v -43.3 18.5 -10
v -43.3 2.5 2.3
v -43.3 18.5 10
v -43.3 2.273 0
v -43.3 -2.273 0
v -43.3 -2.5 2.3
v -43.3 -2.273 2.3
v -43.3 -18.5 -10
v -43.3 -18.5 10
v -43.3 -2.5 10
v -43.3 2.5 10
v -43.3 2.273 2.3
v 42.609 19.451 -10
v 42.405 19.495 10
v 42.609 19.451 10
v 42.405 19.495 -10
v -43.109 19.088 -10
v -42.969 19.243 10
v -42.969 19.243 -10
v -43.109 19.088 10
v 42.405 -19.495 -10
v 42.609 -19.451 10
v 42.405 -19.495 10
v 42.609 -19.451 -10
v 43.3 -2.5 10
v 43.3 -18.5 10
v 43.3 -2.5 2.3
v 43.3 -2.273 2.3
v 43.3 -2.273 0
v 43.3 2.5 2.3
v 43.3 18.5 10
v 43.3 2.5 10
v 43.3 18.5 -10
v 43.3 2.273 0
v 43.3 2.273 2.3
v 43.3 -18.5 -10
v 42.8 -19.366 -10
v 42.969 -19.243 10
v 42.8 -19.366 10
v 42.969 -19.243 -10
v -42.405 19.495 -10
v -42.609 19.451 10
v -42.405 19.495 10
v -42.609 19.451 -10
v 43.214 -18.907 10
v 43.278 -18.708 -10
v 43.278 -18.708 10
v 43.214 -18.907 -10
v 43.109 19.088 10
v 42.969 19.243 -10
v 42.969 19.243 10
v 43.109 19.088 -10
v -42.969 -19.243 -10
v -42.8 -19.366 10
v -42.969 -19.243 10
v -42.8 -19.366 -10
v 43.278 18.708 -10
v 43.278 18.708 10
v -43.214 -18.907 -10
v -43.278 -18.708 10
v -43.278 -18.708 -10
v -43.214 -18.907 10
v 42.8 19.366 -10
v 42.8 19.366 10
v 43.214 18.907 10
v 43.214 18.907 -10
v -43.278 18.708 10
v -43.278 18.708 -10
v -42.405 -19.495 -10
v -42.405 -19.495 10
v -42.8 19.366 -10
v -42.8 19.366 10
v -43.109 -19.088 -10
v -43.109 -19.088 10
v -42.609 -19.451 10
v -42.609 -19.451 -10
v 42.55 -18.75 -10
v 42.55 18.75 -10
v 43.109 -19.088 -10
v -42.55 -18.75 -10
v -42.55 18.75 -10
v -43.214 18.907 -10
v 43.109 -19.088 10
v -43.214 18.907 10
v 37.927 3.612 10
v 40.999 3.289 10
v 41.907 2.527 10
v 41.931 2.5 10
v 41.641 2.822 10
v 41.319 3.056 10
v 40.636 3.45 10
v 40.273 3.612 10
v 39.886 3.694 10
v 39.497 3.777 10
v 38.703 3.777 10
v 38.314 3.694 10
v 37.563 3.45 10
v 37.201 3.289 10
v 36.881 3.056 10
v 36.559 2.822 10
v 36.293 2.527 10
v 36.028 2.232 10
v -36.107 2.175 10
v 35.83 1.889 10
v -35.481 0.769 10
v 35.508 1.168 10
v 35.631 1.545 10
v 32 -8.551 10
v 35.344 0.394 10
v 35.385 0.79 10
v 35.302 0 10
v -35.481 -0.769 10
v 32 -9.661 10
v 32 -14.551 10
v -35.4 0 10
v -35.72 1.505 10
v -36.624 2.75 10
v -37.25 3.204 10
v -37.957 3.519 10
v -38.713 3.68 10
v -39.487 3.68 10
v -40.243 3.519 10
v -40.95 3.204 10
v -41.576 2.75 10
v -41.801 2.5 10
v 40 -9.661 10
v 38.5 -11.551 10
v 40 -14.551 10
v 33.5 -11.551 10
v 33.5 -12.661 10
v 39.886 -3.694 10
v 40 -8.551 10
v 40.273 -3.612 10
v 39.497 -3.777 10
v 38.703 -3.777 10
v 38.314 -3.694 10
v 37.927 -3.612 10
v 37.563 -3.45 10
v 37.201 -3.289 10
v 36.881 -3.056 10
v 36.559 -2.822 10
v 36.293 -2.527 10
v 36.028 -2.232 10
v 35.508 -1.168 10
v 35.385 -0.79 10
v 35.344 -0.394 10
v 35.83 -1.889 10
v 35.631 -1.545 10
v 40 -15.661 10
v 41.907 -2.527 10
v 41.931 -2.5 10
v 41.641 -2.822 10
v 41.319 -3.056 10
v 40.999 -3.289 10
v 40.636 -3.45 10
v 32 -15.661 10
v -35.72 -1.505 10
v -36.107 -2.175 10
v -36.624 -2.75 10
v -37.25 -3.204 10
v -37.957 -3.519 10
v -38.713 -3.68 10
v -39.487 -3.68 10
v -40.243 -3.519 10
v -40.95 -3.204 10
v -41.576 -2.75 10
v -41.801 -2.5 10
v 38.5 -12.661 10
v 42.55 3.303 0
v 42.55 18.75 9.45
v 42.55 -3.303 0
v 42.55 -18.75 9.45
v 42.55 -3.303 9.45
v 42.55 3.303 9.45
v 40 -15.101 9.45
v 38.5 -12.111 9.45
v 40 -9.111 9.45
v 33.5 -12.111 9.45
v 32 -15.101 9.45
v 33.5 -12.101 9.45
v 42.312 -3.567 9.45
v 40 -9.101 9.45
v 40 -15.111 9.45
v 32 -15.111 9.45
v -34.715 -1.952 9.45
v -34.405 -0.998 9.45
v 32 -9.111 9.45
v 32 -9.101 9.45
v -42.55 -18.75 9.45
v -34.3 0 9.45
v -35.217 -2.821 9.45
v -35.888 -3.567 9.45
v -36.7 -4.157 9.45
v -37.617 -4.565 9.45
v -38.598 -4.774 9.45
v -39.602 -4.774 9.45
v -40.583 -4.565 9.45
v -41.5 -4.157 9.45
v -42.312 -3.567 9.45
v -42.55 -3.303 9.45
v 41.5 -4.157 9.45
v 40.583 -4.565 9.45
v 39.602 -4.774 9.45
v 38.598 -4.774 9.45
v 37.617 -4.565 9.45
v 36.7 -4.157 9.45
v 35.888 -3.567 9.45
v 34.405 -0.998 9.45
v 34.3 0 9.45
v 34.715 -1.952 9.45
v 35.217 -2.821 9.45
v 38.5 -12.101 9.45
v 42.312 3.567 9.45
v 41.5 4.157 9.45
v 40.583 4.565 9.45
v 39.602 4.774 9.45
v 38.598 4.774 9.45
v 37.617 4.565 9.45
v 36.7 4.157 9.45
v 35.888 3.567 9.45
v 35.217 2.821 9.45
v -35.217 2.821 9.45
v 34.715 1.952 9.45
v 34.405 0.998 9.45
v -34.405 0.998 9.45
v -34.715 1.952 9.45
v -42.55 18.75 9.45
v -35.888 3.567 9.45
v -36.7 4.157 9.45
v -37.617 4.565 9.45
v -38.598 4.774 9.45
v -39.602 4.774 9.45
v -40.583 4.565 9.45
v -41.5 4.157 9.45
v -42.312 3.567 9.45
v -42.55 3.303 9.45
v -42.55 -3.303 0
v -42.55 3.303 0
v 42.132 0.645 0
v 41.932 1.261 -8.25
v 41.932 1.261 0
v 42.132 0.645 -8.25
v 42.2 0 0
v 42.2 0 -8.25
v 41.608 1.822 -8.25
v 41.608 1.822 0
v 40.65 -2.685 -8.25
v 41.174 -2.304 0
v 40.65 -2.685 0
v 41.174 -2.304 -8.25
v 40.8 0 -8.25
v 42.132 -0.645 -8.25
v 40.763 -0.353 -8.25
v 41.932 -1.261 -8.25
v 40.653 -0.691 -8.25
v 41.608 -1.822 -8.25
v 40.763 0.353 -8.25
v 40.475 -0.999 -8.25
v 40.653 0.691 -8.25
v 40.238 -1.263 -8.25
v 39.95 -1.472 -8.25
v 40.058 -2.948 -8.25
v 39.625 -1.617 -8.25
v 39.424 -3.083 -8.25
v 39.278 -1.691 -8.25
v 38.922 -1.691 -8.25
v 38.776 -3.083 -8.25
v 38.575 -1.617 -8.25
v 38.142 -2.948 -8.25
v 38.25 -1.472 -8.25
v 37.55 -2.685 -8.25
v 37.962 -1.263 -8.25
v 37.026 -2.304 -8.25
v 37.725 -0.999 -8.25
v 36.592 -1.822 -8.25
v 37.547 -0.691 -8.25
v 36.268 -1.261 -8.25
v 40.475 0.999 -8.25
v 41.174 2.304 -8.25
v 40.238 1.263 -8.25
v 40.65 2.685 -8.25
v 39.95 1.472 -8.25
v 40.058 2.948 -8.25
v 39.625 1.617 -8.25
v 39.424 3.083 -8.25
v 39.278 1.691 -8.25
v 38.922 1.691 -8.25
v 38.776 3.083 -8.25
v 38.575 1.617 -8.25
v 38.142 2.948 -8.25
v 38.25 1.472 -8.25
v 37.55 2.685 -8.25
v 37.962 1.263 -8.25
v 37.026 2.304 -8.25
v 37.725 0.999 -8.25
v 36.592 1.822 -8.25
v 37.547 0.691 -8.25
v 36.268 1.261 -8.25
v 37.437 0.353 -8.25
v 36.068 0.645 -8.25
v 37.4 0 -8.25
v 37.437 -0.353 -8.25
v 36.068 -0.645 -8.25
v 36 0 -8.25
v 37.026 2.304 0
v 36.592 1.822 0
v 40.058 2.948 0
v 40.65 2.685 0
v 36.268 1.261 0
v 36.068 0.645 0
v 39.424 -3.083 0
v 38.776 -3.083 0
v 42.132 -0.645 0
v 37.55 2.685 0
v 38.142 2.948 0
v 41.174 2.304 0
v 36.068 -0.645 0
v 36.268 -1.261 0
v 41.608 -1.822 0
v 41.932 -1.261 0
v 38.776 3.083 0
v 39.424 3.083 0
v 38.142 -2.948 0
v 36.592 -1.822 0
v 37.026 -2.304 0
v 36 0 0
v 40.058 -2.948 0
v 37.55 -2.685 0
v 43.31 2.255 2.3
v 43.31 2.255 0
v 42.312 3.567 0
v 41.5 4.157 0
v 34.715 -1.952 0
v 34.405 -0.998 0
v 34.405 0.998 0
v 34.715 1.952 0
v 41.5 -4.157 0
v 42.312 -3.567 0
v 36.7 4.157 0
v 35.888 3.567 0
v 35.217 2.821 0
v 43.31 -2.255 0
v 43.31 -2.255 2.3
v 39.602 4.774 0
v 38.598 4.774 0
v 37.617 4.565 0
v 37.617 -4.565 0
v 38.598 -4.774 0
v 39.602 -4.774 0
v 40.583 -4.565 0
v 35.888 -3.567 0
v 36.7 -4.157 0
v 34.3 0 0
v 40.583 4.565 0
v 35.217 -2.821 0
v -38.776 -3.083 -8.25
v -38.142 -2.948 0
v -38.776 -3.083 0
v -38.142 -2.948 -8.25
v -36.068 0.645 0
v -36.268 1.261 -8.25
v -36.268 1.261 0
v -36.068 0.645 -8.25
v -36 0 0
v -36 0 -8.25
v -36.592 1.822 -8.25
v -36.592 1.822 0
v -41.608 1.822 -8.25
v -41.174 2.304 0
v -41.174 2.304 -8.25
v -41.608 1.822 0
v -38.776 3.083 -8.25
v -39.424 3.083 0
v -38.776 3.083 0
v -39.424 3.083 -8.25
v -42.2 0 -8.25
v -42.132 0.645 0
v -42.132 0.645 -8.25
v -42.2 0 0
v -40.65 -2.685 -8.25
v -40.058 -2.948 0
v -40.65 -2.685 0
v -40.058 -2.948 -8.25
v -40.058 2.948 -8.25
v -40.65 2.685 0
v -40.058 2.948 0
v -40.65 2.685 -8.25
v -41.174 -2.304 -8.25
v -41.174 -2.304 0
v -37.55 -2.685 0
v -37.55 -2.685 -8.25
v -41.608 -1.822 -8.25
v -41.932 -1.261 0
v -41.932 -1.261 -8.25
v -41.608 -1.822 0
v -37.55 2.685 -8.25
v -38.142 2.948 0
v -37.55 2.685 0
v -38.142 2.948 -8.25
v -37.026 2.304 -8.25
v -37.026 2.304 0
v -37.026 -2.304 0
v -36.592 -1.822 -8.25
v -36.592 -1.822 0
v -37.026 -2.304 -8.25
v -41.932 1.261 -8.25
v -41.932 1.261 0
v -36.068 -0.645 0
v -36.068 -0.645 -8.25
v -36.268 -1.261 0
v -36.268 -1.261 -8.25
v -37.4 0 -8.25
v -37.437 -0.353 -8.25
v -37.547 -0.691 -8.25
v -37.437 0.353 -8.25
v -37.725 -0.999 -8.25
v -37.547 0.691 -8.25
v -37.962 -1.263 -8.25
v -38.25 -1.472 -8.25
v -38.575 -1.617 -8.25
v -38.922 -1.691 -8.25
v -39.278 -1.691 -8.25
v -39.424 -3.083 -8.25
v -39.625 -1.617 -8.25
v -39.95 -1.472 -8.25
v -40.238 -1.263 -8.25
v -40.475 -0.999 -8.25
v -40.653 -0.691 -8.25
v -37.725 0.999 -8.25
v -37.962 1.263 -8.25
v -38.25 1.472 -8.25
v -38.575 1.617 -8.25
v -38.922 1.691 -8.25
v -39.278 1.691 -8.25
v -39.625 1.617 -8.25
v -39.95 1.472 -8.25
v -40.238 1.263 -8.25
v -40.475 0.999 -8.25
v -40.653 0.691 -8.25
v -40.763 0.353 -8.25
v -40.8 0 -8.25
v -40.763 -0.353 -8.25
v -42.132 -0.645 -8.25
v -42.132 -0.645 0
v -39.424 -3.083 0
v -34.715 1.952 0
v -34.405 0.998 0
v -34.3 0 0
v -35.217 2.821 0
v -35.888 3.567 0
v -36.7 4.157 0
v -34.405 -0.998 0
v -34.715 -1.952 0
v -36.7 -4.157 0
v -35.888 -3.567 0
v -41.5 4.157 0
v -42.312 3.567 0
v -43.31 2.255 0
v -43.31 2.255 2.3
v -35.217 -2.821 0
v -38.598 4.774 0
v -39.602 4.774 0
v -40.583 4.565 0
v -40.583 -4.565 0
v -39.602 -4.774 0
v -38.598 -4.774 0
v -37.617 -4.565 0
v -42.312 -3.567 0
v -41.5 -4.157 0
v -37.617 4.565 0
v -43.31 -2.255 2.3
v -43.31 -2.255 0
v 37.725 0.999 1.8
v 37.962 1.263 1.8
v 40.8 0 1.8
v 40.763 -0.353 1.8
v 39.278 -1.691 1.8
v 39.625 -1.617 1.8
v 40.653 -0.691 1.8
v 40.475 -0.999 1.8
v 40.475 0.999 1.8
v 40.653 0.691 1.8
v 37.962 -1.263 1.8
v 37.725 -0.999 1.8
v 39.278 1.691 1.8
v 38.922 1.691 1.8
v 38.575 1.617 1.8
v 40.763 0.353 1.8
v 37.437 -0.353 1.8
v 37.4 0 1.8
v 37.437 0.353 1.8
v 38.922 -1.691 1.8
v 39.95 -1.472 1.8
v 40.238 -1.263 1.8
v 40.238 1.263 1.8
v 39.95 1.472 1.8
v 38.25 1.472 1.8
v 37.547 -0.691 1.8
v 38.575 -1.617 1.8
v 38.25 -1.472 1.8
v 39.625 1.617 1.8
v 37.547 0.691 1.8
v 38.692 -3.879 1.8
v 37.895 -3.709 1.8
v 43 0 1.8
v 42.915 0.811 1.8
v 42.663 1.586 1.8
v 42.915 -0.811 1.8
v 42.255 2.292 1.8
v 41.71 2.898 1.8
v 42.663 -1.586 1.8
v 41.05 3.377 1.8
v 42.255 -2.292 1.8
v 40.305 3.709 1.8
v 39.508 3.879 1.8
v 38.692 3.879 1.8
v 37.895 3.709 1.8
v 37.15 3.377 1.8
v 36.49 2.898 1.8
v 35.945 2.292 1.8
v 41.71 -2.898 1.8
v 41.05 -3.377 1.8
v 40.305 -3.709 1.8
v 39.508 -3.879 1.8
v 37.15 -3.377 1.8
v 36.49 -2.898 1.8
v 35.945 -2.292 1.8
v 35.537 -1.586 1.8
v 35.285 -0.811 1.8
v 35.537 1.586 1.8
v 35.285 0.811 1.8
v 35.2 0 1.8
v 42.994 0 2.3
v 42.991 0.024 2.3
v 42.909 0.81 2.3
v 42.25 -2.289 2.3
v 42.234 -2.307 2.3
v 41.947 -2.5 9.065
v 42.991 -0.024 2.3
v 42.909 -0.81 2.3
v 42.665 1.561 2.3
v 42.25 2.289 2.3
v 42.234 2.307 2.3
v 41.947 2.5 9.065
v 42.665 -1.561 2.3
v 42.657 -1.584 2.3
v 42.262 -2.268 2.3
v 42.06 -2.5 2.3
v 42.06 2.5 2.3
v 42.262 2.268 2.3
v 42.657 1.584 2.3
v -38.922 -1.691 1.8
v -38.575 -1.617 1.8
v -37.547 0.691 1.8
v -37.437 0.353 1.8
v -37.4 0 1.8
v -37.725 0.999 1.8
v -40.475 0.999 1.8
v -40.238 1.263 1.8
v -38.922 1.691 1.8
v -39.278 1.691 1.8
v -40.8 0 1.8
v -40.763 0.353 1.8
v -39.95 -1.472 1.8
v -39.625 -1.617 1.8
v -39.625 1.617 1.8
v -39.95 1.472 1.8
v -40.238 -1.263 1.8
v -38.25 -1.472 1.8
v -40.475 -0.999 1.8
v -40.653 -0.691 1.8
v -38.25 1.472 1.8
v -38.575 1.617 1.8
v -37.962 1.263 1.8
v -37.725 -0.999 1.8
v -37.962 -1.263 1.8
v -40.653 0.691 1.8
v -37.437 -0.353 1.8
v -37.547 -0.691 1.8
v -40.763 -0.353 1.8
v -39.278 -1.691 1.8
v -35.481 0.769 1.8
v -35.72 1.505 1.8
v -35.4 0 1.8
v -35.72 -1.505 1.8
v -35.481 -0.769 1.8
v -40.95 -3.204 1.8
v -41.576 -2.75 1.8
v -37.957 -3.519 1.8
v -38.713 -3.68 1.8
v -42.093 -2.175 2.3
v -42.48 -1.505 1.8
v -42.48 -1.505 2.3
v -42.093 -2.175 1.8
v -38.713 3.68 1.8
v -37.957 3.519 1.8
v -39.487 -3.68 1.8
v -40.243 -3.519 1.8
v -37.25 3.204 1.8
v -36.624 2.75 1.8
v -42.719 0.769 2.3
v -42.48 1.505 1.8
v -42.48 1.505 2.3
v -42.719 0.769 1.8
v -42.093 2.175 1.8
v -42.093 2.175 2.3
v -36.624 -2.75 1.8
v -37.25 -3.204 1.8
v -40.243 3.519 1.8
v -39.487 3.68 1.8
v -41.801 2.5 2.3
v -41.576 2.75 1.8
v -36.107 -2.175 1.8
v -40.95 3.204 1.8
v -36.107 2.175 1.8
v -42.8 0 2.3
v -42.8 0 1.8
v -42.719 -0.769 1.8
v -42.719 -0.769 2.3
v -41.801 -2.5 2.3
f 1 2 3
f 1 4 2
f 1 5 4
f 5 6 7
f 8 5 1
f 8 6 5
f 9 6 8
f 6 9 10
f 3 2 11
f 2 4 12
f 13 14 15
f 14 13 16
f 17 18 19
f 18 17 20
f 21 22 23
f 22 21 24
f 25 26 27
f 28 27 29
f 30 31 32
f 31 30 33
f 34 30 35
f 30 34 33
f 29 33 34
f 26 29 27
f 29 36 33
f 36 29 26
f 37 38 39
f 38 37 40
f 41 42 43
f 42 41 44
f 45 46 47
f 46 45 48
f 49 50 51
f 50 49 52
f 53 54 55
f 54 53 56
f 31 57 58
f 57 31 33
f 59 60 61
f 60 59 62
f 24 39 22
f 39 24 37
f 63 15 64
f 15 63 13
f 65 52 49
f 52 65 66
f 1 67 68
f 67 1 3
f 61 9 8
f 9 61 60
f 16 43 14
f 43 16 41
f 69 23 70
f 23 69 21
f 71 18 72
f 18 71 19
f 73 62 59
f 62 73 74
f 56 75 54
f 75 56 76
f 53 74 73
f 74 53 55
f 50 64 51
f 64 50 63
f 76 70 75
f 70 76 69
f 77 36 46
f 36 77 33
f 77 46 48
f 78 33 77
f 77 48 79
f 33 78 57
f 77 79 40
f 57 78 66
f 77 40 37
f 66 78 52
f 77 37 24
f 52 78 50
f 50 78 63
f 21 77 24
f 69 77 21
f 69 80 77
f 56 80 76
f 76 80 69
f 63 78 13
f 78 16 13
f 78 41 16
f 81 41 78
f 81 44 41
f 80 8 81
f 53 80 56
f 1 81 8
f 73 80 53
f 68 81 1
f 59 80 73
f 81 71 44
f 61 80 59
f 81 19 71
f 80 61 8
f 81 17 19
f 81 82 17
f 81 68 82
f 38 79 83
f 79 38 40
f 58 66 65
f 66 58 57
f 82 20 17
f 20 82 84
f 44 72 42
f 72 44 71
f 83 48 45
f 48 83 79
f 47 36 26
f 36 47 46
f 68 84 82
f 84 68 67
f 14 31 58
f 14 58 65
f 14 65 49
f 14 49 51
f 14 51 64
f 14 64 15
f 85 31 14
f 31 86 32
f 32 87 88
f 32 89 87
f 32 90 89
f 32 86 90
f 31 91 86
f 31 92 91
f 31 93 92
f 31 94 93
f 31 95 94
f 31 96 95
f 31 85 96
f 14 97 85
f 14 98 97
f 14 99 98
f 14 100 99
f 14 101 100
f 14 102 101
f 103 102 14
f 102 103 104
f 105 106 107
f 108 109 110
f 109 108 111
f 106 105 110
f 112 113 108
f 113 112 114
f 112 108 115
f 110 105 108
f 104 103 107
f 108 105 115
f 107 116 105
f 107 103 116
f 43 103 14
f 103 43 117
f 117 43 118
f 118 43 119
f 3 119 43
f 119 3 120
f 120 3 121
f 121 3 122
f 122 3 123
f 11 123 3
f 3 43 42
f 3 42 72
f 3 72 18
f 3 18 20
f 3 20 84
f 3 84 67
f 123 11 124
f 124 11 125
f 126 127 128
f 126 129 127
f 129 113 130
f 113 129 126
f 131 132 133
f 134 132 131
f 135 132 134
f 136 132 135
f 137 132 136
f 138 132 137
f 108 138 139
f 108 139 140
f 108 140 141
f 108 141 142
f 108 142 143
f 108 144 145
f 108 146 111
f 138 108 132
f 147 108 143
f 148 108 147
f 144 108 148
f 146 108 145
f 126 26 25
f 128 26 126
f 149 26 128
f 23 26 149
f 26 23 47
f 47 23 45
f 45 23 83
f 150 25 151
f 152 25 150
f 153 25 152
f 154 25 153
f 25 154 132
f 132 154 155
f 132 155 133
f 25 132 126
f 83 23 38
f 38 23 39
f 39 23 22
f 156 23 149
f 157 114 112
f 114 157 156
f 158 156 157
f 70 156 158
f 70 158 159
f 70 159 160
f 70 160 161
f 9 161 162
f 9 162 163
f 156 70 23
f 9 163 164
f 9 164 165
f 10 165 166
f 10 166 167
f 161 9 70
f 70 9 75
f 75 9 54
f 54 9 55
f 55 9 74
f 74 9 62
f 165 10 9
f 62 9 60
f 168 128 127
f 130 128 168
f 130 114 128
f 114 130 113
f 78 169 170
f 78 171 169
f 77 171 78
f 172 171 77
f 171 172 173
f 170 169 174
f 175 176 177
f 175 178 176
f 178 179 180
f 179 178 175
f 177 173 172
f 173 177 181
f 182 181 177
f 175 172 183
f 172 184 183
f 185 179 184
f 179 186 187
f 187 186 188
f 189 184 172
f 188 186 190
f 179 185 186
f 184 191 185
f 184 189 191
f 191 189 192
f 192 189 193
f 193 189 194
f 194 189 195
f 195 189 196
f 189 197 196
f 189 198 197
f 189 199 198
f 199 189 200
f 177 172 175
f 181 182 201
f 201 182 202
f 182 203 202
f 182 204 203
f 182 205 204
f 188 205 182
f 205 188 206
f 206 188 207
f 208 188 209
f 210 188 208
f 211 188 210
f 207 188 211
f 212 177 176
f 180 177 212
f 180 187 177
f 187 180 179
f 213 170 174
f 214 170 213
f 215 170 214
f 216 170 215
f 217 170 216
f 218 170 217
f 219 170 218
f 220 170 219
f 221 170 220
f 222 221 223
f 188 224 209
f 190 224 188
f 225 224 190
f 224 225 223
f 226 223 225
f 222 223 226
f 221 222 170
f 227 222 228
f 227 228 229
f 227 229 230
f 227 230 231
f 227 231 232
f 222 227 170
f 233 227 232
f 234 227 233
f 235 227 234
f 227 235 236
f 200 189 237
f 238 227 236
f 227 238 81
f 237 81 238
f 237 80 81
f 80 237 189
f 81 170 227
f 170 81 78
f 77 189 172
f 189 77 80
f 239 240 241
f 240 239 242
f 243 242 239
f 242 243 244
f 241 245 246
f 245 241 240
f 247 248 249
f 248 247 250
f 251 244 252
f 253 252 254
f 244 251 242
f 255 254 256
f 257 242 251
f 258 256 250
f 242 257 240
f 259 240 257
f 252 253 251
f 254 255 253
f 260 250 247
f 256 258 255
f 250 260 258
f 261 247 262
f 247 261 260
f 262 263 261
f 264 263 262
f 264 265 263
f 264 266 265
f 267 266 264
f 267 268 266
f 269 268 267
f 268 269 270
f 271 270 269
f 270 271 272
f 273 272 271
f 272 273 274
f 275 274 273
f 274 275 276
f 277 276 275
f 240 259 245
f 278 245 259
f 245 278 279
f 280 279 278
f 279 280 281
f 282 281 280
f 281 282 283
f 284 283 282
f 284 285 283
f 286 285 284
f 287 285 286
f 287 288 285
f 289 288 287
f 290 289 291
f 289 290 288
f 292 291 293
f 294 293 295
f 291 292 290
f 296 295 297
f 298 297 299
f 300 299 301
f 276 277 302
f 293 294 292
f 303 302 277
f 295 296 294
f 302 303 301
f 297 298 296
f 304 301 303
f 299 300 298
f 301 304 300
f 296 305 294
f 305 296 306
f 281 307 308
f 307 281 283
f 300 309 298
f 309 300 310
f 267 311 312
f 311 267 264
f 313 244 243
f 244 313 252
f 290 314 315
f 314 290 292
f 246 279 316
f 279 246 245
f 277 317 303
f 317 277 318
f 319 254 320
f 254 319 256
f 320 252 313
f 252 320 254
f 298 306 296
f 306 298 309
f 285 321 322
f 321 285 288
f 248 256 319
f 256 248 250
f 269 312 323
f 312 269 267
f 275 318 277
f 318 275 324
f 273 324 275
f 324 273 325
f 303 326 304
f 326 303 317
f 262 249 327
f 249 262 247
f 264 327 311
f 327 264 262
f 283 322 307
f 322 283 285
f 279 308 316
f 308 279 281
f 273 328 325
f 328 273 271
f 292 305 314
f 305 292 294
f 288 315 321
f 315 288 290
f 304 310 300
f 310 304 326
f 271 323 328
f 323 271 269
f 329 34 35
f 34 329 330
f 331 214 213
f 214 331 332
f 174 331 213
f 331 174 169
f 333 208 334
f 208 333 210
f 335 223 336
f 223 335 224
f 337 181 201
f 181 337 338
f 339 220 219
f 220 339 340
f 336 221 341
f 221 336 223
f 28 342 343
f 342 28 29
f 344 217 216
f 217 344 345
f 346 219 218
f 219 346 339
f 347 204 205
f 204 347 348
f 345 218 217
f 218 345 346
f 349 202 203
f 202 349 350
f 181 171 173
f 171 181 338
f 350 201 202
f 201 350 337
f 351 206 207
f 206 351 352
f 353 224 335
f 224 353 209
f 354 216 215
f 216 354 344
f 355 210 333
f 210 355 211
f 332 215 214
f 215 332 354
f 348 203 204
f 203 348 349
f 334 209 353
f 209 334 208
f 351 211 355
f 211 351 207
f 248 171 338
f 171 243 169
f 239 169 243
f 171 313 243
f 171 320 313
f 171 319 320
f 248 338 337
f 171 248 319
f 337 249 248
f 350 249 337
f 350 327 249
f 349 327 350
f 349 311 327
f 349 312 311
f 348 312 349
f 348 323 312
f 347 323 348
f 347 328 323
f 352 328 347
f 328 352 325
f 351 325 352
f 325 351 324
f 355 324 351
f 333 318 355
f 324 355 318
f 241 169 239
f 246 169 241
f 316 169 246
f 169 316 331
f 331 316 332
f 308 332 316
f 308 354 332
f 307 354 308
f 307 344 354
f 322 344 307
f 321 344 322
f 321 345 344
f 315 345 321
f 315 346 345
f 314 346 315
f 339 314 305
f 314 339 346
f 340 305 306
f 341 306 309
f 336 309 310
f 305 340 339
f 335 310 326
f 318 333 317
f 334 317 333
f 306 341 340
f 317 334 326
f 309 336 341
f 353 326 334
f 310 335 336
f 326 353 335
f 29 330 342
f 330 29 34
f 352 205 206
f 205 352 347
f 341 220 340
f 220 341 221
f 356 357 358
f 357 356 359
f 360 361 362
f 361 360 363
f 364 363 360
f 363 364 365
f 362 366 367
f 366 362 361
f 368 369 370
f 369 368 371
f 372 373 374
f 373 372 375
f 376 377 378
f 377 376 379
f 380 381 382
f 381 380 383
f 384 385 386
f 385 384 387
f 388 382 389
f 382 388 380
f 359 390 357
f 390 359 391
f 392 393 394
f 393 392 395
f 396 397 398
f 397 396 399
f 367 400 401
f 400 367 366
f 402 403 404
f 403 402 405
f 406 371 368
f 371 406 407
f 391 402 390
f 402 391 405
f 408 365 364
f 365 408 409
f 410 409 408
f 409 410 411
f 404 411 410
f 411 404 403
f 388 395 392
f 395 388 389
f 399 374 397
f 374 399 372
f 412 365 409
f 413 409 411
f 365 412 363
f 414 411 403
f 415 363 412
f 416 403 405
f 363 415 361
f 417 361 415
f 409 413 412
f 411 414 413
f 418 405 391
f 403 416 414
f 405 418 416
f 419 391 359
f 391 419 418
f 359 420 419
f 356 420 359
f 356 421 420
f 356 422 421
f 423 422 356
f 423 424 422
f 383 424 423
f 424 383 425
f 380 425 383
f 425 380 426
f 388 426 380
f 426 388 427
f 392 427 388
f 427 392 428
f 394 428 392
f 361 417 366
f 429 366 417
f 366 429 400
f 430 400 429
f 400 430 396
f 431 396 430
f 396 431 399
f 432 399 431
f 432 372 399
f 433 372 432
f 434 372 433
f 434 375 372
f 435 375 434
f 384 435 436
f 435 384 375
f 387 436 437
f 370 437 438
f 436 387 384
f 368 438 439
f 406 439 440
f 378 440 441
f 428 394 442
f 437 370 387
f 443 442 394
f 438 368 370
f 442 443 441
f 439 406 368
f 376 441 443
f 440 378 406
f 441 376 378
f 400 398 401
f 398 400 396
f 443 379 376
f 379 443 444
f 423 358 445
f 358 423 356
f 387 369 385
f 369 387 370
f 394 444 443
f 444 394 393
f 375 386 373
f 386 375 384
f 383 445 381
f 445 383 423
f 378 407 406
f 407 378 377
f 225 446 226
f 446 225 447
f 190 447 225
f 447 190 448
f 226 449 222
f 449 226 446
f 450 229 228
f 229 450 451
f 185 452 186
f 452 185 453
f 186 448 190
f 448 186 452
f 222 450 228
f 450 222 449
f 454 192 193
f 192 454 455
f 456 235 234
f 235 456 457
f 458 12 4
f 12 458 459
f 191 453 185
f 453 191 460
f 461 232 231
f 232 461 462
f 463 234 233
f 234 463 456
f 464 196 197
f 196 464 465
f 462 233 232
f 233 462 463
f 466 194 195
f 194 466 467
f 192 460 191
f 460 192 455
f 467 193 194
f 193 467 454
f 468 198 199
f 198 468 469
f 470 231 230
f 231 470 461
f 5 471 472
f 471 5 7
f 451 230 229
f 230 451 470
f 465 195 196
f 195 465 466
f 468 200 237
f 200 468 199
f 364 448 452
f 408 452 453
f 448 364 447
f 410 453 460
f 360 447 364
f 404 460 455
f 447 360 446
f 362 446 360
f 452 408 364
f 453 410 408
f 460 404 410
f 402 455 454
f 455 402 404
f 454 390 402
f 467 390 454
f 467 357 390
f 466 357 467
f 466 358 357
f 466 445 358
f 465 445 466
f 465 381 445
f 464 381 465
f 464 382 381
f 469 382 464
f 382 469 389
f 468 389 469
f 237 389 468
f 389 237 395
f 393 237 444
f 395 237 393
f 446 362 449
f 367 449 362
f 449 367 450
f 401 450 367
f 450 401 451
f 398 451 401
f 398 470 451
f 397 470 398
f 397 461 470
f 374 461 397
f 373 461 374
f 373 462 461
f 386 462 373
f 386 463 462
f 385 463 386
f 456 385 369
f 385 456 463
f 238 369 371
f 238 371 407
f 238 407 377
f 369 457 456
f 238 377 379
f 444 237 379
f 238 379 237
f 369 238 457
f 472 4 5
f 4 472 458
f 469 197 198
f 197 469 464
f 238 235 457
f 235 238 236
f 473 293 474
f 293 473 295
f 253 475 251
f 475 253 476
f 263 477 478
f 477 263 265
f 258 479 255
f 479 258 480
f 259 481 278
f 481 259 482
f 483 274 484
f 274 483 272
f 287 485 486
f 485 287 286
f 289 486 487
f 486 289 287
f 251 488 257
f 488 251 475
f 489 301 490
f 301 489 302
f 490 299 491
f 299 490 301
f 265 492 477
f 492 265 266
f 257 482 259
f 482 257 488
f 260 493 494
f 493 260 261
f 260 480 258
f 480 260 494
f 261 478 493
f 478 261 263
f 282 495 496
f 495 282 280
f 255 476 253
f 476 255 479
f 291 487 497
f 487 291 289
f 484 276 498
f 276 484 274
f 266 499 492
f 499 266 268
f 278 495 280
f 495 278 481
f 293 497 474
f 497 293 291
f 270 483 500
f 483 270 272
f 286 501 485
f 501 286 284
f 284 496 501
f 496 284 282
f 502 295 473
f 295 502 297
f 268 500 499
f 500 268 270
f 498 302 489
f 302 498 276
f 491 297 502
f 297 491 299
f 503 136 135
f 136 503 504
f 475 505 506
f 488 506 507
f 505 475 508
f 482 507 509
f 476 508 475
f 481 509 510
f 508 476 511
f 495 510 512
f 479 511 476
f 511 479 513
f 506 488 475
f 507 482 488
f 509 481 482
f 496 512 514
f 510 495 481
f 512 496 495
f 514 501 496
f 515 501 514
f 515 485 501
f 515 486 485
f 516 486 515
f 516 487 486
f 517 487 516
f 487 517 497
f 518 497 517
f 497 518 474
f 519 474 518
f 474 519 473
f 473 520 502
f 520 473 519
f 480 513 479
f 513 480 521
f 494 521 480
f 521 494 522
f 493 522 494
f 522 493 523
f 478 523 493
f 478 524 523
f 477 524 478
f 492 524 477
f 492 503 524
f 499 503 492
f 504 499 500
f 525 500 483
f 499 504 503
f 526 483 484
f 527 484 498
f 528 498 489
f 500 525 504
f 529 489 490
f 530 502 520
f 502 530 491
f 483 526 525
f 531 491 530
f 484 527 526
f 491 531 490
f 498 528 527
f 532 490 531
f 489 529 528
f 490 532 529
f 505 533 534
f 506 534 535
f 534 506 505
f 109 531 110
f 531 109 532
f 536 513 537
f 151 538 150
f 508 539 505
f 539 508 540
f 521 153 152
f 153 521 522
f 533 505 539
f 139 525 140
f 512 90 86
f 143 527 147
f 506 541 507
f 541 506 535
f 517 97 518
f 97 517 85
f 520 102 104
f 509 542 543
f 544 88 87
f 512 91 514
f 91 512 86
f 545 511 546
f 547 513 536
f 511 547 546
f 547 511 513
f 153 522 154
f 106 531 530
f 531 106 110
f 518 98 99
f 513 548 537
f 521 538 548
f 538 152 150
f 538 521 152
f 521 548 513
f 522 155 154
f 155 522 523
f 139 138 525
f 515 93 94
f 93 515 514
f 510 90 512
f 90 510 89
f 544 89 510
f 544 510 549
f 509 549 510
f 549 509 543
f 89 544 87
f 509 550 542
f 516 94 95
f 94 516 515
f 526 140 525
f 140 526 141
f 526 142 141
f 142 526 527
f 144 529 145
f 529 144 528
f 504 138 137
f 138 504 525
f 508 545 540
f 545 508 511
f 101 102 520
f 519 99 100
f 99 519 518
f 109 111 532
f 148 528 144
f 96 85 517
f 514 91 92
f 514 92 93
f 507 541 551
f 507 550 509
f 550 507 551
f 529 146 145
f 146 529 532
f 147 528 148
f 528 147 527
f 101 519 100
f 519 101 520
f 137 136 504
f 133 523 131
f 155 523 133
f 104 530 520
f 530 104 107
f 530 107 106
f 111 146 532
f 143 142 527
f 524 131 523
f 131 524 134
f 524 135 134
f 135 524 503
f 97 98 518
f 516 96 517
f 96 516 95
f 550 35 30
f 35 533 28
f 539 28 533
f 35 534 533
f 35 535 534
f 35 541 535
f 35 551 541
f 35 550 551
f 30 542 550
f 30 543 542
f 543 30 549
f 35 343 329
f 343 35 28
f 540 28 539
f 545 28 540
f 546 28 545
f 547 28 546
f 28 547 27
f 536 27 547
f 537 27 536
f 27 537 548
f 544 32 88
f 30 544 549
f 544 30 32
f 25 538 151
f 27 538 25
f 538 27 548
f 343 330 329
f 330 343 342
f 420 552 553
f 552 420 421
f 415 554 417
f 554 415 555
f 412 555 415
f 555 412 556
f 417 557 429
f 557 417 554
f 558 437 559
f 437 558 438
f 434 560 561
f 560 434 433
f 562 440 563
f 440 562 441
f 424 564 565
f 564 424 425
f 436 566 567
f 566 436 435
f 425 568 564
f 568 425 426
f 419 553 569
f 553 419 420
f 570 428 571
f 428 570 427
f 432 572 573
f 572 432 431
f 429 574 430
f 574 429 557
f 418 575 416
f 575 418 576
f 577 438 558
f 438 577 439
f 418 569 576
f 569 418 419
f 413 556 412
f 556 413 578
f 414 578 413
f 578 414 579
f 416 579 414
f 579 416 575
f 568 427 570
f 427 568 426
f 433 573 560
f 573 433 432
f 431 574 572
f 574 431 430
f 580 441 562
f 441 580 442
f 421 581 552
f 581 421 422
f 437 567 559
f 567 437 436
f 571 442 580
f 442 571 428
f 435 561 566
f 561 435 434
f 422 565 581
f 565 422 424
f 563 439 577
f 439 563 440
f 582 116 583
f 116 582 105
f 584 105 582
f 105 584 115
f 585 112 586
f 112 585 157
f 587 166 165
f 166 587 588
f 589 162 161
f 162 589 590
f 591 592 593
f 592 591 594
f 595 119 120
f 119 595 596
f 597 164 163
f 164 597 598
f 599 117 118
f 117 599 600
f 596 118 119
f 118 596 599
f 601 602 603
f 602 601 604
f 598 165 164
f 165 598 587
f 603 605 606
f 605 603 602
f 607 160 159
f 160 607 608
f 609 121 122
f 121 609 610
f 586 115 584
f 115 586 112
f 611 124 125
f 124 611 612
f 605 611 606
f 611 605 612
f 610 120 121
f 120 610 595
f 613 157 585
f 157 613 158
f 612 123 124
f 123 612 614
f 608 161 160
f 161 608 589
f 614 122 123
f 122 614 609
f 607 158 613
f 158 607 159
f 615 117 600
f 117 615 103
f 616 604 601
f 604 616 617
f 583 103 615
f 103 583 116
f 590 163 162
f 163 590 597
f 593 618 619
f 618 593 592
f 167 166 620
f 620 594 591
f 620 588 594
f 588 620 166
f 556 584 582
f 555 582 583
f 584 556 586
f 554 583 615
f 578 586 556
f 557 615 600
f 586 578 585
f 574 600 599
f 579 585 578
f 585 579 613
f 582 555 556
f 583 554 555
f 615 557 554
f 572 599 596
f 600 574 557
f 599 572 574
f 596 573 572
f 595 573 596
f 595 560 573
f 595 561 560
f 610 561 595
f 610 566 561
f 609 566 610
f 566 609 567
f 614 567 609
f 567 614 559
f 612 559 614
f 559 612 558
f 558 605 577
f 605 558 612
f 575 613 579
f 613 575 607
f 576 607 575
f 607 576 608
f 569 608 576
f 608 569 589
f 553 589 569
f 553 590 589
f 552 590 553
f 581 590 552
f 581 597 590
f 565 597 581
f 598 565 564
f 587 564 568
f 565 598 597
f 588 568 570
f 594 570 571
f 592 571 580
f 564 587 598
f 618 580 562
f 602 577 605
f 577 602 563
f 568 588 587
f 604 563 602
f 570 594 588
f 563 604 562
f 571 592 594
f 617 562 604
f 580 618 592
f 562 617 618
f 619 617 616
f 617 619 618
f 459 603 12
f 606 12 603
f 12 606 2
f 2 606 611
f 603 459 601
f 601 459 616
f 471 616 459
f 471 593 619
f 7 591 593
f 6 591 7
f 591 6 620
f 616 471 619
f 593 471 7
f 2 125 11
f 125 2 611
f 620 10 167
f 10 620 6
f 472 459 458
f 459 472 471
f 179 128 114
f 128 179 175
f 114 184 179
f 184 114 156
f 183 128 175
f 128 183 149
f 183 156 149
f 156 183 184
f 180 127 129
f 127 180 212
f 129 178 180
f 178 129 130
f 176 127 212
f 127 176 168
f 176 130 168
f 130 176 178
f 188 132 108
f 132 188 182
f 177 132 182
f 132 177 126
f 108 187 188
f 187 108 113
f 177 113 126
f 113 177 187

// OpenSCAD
// Higher definition curves
$fs = 0.01;

module roundedcube(size = [1, 1, 1], center = false, radius = 0.5, apply_to = "all") {
	// If single value, convert to [x, y, z] vector
	size = (size[0] == undef) ? [size, size, size] : size;

	translate_min = radius;
	translate_xmax = size[0] - radius;
	translate_ymax = size[1] - radius;
	translate_zmax = size[2] - radius;

	diameter = radius * 2;

	module build_point(type = "sphere", rotate = [0, 0, 0]) {
		if (type == "sphere") {
			sphere(r = radius);
		} else if (type == "cylinder") {
			rotate(a = rotate)
			cylinder(h = diameter, r = radius, center = true);
		}
	}

	obj_translate = (center == false) ?
		[0, 0, 0] : [
			-(size[0] / 2),
			-(size[1] / 2),
			-(size[2] / 2)
		];

	translate(v = obj_translate) {
		hull() {
			for (translate_x = [translate_min, translate_xmax]) {
				x_at = (translate_x == translate_min) ? "min" : "max";
				for (translate_y = [translate_min, translate_ymax]) {
					y_at = (translate_y == translate_min) ? "min" : "max";
					for (translate_z = [translate_min, translate_zmax]) {
						z_at = (translate_z == translate_min) ? "min" : "max";

						translate(v = [translate_x, translate_y, translate_z])
						if (
							(apply_to == "all") ||
							(apply_to == "xmin" && x_at == "min") || (apply_to == "xmax" && x_at == "max") ||
							(apply_to == "ymin" && y_at == "min") || (apply_to == "ymax" && y_at == "max") ||
							(apply_to == "zmin" && z_at == "min") || (apply_to == "zmax" && z_at == "max")
						) {
							build_point("sphere");
						} else {
							rotate = 
								(apply_to == "xmin" || apply_to == "xmax" || apply_to == "x") ? [0, 90, 0] : (
								(apply_to == "ymin" || apply_to == "ymax" || apply_to == "y") ? [90, 90, 0] :
								[0, 0, 0]
							);
							build_point("cylinder", rotate);
						}
					}
				}
			}
		}
	}
}

holeoff=4.2;
wide=86.6;
widein=wide-1.5;
latime=39.0;
latimein=latime-1.5;
screw_bord_small_h=16.5;
screw_bord_larg_x=(wide/2)-holeoff;
deccub=screw_bord_larg_x+6;
clip_cube_hole_x=(wide/2)+7.51;//51.85;
sml_ext_r=3.1;

hght=20;
int_hl=1.7;
cuhole=5.0;
sbh=10.0;
solid_big_r=4.8;

difference(){

    union()
    {
        difference() {
            
            roundedcube([wide,latime,hght], true, 1.0,"xy");
            translate([0,00,-6]){
                cube([widein,latimein,30.9], center=true );
            }
        }

        union(){
            union(){
                translate([screw_bord_larg_x,0,0]){
                    cylinder(screw_bord_small_h,sml_ext_r,sml_ext_r,center=true);
                }
                // big solid cyl
                translate([screw_bord_larg_x,0,5]){
                    cylinder(sbh,solid_big_r,solid_big_r,center=true);
                }
            }
        }

        union(){
            union(){
                translate([-screw_bord_larg_x,0,0]){
                    cylinder(screw_bord_small_h,sml_ext_r,sml_ext_r,center=true);
                }
                // big solid cyl
                translate([-screw_bord_larg_x,0,5]){
                    cylinder(sbh,solid_big_r,solid_big_r,center=true);
                }
            }
        }
        /*
       translate([30,-6,-8]){
            cube([13,1.0,18]);
       }
       translate([30,-18,-8]){
            cube([1,12.0,18]);
       }
        */
    }
    
    union(){
    

        
        cube_open=8.5;
        
        
        union(){
            translate([screw_bord_larg_x,0,0]){
                cylinder(26,int_hl,int_hl,center=true);
            }
            // cut big
            translate([screw_bord_larg_x,0,9.8]){
                cylinder(16,3.9,3.7,center=true);
            }
            
            translate([deccub,0,9.8]){
                cube([13, cuhole, 15],center=true);
            }

            translate([clip_cube_hole_x,0,9.8]){
                cube([15,cube_open,45],center=true);
            }
        }

        union(){
            translate([-screw_bord_larg_x,0,0]){
                cylinder(26,int_hl,int_hl,center=true);
            }
            translate([-screw_bord_larg_x,0,9.8]){
                cylinder(16,3.7,3.7,center=true);
            }
            
            translate([-deccub,0,9.8]){
                cube([13,cuhole,15],center=true);
            }

            translate([-clip_cube_hole_x,0,9.8]){
                cube([15,cube_open,45],center=true);
            }

        }
    }
    CW=1.2;
    YTR=10.4;
    CH=1.5;
    TRP=36;
    union(){
        translate([TRP,-15,YTR]){
            rotate([45,0,0]){   
                cube([8,CH,CW], center=true);
            }
            
        }
        translate([TRP,-12,YTR]){
            rotate([45,0,0]){   
                cube([5,CH,CW], center=true);
            }
            
        }
        translate([TRP,-9,YTR]){
           rotate([45,0,0]){
                cube([8,CH,CW], center=true);
                }
        }
  
    }
    
}
